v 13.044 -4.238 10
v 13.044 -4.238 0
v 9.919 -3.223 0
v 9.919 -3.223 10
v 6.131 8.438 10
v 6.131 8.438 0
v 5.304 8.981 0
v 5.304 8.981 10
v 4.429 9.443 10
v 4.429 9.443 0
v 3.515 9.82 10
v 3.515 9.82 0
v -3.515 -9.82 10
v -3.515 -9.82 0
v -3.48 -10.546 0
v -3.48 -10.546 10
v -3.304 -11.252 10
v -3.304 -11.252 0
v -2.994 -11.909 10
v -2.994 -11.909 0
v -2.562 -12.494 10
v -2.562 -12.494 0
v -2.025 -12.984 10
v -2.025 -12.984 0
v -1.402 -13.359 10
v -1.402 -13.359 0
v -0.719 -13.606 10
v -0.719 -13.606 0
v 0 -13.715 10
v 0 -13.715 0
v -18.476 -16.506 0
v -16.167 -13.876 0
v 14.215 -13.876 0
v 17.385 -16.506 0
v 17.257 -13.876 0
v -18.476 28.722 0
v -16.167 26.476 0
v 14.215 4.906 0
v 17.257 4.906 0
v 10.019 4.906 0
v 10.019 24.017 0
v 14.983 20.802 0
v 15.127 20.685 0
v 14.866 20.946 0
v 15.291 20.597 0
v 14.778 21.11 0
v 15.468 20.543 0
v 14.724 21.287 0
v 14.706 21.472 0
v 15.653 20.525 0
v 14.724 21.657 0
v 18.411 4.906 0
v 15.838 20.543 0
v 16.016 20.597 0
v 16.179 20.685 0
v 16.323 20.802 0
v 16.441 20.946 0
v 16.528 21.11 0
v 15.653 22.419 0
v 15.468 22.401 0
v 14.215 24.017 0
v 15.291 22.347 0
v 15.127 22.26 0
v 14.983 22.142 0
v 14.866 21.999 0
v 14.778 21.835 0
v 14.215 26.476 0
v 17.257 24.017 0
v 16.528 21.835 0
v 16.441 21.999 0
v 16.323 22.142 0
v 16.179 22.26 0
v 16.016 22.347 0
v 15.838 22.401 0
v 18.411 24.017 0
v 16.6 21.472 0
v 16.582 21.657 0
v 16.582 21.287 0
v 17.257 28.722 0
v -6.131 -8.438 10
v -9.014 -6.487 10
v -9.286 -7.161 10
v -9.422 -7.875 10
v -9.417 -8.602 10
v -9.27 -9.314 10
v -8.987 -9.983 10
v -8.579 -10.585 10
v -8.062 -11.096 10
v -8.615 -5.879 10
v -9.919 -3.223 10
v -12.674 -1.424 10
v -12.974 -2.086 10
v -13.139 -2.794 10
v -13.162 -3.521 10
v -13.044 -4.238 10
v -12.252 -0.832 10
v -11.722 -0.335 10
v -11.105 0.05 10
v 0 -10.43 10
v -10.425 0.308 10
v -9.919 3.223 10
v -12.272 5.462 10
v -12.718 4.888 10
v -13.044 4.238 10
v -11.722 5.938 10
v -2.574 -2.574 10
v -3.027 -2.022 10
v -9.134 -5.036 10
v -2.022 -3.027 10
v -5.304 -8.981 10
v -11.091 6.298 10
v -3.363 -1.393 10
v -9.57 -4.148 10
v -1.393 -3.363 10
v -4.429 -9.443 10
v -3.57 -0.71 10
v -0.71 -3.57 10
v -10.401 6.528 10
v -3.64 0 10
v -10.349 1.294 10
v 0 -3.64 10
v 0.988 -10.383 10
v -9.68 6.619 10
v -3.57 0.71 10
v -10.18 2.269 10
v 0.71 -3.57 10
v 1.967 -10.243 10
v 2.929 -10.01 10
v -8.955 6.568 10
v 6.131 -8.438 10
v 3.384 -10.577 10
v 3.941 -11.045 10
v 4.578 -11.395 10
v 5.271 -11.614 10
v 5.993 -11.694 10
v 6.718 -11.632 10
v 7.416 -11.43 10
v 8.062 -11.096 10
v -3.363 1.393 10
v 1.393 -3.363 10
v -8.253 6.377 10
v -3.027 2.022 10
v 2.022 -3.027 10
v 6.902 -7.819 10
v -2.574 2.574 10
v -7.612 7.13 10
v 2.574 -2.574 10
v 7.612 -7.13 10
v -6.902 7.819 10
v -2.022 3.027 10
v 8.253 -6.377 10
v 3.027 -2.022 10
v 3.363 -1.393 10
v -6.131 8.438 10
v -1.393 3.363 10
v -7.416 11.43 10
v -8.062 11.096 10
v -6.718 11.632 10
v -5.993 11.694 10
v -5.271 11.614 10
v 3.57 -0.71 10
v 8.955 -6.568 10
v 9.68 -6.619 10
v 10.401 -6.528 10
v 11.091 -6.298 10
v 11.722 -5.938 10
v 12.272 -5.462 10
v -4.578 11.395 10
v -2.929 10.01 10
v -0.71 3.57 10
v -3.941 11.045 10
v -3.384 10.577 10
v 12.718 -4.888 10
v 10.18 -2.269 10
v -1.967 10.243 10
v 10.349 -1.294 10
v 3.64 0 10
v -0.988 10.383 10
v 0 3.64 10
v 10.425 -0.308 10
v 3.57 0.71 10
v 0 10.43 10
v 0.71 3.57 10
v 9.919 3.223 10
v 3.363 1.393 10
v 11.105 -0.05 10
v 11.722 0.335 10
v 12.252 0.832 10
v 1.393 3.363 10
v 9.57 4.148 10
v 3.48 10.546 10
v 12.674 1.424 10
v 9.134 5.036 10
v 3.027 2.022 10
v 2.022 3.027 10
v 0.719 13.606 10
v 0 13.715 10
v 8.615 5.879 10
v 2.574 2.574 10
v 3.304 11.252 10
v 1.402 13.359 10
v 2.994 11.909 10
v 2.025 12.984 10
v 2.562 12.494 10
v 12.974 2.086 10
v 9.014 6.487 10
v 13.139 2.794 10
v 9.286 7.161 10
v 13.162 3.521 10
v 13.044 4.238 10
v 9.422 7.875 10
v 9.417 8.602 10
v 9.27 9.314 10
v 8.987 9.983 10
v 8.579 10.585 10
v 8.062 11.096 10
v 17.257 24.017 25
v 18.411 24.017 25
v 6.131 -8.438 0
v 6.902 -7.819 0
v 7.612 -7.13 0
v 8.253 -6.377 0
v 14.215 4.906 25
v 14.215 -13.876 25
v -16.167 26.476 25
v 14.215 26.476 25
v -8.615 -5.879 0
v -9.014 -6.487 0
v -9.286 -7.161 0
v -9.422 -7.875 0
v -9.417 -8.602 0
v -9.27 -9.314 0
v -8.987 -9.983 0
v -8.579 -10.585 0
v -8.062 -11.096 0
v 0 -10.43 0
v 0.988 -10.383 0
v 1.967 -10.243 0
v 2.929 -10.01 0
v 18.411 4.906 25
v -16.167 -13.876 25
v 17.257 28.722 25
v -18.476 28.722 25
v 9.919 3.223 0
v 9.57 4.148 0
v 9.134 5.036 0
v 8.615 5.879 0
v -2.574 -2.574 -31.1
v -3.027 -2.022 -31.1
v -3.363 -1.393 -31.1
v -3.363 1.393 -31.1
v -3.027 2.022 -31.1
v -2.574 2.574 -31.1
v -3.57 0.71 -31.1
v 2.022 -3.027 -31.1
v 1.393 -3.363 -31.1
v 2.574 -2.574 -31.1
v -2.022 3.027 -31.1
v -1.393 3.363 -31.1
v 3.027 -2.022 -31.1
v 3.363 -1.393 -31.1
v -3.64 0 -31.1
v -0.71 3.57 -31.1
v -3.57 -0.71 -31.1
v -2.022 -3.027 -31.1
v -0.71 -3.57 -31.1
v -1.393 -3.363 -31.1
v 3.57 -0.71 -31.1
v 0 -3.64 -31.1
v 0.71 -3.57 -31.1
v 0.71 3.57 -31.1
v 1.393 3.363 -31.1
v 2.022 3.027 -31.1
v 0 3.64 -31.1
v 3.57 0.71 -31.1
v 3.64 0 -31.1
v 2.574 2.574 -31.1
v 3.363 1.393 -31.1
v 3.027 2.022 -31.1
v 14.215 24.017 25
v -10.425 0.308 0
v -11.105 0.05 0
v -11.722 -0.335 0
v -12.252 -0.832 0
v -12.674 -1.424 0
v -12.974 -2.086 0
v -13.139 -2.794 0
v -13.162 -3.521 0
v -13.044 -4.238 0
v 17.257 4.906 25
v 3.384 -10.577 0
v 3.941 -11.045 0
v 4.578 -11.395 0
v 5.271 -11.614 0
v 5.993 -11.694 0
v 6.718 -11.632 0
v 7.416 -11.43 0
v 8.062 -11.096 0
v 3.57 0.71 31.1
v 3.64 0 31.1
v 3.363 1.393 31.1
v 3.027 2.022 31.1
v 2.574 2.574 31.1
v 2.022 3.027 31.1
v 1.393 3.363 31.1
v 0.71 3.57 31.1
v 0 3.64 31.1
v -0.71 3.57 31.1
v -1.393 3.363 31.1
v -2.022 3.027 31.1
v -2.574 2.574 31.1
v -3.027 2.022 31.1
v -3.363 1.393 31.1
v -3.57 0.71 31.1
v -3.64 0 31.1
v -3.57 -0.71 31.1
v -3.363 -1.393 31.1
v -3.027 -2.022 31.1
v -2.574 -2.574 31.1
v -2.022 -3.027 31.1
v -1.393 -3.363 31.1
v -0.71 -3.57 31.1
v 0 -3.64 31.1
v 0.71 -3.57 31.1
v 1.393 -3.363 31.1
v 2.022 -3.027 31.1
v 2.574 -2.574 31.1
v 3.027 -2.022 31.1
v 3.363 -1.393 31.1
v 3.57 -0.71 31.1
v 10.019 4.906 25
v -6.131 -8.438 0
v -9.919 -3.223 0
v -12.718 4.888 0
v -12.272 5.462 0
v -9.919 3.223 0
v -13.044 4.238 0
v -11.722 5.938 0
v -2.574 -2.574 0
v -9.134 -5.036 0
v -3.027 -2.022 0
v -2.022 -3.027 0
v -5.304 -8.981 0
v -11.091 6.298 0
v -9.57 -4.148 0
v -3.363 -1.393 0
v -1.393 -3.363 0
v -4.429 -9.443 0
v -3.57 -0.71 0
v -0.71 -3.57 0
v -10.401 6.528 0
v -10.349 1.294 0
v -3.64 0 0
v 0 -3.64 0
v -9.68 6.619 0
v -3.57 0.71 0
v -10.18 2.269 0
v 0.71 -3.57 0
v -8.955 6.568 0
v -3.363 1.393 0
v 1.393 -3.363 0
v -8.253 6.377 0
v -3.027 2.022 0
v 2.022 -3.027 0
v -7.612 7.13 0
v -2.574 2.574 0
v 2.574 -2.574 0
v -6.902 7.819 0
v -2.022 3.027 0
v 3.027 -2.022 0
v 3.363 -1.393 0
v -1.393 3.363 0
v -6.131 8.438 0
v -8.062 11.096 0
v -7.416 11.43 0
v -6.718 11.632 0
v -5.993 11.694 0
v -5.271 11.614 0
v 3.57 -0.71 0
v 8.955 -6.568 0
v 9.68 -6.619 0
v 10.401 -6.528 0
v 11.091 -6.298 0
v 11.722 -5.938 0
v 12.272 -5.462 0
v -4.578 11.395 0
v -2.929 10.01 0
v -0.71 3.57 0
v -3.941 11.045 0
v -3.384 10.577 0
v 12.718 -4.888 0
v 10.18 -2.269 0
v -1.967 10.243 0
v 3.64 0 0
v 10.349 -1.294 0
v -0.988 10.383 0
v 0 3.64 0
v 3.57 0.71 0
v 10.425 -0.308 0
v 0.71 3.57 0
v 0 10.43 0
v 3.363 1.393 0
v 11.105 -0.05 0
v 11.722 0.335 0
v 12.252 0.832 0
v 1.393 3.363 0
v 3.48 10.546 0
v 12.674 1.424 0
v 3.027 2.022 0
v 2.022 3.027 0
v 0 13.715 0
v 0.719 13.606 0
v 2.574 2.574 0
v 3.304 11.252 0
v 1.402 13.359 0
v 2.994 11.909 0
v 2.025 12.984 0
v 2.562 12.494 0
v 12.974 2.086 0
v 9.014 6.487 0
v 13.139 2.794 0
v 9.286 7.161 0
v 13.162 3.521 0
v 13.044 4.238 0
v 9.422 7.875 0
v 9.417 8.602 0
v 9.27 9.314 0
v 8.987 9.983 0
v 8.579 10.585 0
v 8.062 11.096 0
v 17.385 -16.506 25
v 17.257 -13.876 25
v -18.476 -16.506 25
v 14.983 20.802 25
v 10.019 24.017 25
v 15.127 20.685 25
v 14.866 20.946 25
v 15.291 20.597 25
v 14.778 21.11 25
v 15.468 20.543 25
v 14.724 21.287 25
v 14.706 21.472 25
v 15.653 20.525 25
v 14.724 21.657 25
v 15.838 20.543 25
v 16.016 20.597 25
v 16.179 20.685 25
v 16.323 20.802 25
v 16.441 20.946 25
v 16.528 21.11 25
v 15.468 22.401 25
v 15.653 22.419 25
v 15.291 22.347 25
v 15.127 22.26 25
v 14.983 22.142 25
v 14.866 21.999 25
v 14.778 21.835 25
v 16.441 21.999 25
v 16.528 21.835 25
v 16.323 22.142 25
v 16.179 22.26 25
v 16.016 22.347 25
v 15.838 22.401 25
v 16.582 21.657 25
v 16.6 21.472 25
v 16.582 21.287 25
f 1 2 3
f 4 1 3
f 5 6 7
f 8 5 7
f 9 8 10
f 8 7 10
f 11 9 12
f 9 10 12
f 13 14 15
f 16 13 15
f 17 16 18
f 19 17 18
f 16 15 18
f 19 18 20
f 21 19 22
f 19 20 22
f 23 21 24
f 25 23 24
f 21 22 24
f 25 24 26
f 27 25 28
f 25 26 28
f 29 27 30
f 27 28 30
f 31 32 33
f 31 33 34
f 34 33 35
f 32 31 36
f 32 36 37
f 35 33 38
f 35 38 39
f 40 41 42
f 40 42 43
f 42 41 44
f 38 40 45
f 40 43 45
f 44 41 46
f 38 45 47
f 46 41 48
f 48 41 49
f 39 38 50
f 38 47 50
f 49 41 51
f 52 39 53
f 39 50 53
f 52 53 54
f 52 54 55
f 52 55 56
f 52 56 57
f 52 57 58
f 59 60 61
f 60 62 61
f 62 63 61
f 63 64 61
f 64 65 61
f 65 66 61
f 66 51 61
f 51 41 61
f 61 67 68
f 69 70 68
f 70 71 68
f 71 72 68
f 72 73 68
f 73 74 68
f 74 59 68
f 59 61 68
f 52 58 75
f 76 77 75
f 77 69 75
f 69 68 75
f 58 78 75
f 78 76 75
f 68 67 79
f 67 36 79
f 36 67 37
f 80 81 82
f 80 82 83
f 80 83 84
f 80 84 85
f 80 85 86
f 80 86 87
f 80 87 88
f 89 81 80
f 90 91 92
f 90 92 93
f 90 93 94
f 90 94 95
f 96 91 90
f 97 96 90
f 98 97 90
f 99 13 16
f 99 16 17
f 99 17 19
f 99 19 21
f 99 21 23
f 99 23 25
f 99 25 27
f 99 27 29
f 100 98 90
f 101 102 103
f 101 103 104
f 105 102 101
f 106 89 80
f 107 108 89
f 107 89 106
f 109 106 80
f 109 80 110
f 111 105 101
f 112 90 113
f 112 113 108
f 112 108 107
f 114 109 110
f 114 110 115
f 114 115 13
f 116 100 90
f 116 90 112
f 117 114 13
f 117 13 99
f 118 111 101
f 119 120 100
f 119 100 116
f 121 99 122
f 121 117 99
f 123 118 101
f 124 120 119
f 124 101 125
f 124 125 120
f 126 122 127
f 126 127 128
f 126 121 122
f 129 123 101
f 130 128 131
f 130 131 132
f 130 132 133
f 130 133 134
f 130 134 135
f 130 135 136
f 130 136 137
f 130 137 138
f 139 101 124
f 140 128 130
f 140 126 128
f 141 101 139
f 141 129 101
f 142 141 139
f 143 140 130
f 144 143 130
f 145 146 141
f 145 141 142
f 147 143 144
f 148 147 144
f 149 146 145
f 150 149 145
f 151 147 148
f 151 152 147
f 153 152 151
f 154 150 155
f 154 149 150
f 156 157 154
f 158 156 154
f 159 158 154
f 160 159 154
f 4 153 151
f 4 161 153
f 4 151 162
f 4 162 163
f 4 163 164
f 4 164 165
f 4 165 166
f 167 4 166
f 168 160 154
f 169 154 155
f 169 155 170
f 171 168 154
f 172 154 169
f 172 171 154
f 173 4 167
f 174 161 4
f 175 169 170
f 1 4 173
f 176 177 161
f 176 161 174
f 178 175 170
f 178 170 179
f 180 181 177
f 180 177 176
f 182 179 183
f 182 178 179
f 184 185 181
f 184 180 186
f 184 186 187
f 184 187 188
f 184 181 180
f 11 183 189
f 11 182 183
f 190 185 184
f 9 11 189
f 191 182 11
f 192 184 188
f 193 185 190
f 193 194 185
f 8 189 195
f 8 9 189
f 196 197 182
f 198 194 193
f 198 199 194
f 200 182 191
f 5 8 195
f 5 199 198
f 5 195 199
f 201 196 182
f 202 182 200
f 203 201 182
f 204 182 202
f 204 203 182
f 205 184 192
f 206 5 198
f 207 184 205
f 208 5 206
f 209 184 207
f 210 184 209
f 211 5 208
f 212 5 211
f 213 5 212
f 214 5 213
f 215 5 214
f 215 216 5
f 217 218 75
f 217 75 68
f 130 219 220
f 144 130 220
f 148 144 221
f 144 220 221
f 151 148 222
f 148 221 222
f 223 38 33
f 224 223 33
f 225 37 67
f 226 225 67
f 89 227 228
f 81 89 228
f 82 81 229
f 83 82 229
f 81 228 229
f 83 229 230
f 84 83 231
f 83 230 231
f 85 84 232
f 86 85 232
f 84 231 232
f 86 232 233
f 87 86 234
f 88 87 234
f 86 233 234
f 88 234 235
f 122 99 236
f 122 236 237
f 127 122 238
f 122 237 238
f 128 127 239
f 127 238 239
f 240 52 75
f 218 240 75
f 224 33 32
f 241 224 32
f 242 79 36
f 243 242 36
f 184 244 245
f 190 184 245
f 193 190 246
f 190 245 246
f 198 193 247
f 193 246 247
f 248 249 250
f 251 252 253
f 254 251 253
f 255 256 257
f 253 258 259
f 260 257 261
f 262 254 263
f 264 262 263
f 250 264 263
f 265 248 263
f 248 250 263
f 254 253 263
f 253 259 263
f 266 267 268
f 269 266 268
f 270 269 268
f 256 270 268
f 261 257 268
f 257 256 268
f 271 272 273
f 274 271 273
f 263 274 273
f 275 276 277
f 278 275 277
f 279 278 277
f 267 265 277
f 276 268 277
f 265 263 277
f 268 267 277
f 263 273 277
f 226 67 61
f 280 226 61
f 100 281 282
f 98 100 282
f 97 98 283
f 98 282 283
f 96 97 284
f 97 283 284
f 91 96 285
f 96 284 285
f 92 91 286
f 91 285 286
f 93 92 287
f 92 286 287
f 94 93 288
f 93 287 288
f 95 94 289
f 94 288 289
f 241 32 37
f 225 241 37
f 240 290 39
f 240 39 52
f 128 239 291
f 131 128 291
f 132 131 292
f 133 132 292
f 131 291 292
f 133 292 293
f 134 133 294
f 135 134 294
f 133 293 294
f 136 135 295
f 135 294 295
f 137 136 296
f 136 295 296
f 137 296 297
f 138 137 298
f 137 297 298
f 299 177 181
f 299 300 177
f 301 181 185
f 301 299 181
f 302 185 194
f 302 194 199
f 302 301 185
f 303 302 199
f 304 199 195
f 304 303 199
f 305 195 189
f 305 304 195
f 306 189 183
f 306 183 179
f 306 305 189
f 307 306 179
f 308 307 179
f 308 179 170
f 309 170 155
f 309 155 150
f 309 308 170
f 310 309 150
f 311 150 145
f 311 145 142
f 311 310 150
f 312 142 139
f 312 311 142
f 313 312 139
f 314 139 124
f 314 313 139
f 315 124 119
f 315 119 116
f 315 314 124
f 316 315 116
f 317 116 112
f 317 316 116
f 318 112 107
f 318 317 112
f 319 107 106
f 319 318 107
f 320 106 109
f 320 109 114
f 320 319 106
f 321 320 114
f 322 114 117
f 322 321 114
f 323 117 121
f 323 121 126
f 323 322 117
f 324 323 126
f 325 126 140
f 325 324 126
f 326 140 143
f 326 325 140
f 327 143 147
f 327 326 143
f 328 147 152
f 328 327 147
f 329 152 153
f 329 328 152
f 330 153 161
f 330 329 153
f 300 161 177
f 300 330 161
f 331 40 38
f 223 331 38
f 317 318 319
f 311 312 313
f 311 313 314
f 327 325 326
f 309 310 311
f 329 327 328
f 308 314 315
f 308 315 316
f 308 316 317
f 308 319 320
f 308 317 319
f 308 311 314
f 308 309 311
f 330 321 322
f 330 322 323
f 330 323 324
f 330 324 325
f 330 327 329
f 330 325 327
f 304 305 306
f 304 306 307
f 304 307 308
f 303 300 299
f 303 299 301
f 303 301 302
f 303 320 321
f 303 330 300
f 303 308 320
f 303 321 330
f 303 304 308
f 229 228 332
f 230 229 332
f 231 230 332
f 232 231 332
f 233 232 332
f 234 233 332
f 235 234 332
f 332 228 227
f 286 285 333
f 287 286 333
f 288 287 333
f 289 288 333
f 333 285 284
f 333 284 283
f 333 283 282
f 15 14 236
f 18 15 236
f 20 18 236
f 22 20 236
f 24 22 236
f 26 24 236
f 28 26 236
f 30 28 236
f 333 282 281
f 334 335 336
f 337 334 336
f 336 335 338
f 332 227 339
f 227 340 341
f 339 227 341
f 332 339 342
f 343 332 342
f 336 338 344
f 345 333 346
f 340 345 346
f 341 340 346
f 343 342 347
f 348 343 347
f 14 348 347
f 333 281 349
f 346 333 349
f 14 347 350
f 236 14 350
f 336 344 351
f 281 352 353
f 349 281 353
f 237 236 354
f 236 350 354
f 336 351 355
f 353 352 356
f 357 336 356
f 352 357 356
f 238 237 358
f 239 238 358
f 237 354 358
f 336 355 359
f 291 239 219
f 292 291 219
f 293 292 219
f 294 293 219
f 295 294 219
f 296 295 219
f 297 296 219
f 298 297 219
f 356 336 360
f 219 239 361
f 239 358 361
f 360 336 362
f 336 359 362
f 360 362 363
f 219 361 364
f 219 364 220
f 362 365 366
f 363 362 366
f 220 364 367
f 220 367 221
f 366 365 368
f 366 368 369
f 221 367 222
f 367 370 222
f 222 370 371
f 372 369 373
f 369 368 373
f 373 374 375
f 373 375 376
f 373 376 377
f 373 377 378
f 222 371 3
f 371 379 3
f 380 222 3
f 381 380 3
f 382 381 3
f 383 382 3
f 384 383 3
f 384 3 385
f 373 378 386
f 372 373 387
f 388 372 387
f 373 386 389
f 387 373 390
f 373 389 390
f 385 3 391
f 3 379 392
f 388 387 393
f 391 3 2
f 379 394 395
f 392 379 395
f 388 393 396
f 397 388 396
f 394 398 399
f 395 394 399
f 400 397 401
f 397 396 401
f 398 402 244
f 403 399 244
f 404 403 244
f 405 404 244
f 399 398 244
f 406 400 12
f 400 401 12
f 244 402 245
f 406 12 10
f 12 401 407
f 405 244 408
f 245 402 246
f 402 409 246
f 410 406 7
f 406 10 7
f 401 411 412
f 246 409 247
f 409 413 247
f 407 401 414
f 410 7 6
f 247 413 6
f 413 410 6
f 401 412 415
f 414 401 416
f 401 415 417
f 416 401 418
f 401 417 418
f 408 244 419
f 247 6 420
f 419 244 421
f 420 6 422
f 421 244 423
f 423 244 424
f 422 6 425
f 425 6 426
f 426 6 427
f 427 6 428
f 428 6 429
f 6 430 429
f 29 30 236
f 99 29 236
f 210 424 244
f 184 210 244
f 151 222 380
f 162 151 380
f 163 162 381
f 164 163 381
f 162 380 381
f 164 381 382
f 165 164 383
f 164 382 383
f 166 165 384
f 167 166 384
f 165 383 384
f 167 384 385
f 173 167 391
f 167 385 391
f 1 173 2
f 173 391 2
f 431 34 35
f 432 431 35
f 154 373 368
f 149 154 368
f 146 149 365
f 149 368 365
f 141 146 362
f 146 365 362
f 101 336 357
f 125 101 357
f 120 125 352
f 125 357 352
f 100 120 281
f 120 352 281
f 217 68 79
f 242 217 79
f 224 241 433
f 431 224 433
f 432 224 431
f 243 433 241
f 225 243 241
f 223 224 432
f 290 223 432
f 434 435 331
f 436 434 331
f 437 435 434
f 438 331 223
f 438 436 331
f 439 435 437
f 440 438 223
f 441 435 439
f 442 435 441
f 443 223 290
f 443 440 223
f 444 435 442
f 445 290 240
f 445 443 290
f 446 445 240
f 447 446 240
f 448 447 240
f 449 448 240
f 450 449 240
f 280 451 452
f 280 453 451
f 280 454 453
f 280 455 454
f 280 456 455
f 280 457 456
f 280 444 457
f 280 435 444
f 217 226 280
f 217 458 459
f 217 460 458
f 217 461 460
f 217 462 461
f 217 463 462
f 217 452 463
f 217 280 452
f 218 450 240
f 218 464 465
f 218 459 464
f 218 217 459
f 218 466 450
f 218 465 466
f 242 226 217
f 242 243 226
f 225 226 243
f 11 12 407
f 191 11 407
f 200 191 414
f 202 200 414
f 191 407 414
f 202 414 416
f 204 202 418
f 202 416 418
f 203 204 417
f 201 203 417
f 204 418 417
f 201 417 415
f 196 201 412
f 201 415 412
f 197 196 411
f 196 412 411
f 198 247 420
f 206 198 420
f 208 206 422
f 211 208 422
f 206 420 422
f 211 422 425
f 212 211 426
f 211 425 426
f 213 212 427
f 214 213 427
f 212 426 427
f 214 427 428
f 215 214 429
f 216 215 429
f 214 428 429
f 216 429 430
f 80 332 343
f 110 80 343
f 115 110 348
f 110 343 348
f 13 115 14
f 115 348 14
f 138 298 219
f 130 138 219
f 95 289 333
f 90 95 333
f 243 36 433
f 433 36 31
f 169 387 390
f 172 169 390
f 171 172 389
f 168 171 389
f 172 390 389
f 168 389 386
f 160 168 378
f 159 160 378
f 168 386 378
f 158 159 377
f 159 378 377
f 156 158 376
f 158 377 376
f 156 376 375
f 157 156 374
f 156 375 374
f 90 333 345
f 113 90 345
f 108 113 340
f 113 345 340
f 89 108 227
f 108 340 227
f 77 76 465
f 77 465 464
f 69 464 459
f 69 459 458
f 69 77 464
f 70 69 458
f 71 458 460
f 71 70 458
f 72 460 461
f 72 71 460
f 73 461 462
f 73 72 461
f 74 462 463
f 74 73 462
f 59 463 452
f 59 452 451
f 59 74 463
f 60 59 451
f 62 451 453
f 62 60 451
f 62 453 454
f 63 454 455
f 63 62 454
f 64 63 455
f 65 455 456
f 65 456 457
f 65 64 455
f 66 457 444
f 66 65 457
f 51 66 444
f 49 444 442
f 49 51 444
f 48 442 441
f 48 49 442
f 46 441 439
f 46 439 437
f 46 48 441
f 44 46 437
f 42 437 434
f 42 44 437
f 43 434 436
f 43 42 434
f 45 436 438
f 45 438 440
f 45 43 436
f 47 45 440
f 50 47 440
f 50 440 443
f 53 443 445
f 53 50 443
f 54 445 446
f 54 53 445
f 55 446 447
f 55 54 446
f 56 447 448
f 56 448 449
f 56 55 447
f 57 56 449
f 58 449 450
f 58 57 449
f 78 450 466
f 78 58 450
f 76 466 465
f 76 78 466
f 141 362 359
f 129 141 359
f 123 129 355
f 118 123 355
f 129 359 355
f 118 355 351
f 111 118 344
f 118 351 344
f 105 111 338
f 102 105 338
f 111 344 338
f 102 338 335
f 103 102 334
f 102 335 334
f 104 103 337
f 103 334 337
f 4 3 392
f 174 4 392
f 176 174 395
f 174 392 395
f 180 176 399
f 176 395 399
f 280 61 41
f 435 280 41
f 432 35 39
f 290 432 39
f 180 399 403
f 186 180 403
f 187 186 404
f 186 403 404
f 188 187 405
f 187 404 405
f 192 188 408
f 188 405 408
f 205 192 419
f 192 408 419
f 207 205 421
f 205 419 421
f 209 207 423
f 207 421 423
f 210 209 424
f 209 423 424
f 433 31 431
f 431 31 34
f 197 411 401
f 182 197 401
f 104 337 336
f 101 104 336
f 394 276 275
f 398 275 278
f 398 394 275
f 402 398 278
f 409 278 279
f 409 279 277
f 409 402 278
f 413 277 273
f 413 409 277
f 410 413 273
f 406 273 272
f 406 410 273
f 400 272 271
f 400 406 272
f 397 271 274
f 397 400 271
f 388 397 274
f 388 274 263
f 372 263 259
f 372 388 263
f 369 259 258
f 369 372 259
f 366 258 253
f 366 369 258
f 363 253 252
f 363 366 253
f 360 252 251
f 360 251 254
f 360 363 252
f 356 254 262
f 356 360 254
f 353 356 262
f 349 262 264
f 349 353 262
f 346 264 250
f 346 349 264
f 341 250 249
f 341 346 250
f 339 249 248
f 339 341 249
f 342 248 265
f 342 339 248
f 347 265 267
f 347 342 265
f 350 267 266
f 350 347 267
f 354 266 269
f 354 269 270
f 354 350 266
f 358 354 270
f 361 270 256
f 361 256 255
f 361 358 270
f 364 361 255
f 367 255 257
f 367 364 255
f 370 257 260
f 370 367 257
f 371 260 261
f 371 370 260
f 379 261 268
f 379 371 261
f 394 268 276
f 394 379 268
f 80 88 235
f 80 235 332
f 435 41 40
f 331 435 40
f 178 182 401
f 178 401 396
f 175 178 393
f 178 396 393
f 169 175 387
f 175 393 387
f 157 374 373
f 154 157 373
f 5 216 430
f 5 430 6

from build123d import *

# Parameters (mm, degrees)
F0_R     = 3.640353
F1_DEPTH = 10
F2_R     = 0.947204
F3_DEPTH = 25
F4_DEPTH = 31.1


with BuildPart() as f1:
    # F0 (on Top) → F1 (new body)
    with BuildSketch(Plane.XY):
        with BuildLine():
            Line((-8.061643, 11.0959), (-6.130575, 8.438013))
            ThreePointArc((-6.130575, 8.438013), (-7.265387, 7.483192), (-8.253301, 6.377071))
            ThreePointArc((-8.253301, 6.377071), (-11.09072, 6.297838), (-13.044013, 4.238257))
            Line((-13.044013, 4.238257), (-9.919479, 3.223034))
            ThreePointArc((-9.919479, 3.223034), (-10.276331, 1.783543), (-10.425409, 0.307991))
            ThreePointArc((-10.425409, 0.307991), (-12.674357, -1.423904), (-13.044013, -4.238257))
            Line((-13.044013, -4.238257), (-9.919479, -3.223034))
            ThreePointArc((-9.919479, -3.223034), (-9.362067, -4.59736), (-8.615365, -5.878732))
            ThreePointArc((-8.615365, -5.878732), (-9.416821, -8.601763), (-8.061643, -11.0959))
            Line((-8.061643, -11.0959), (-6.130575, -8.438013))
            ThreePointArc((-6.130575, -8.438013), (-4.871811, -9.222227), (-3.514545, -9.819979))
            ThreePointArc((-3.514545, -9.819979), (-2.562379, -12.494041), (0, -13.715287))
            Line((0, -13.715287), (0, -10.429957))
            ThreePointArc((0, -10.429957), (1.479311, -10.324517), (2.928712, -10.010327))
            ThreePointArc((2.928712, -10.010327), (5.270805, -11.614019), (8.061643, -11.0959))
            Line((8.061643, -11.0959), (6.130575, -8.438013))
            ThreePointArc((6.130575, -8.438013), (7.265387, -7.483192), (8.253301, -6.377071))
            ThreePointArc((8.253301, -6.377071), (11.09072, -6.297838), (13.044013, -4.238257))
            Line((13.044013, -4.238257), (9.919479, -3.223034))
            ThreePointArc((9.919479, -3.223034), (10.276331, -1.783543), (10.425409, -0.307991))
            ThreePointArc((10.425409, -0.307991), (12.674357, 1.423904), (13.044013, 4.238257))
            Line((13.044013, 4.238257), (9.919479, 3.223034))
            ThreePointArc((9.919479, 3.223034), (9.362067, 4.59736), (8.615365, 5.878732))
            ThreePointArc((8.615365, 5.878732), (9.416821, 8.601763), (8.061643, 11.0959))
            Line((8.061643, 11.0959), (6.130575, 8.438013))
            ThreePointArc((6.130575, 8.438013), (4.871811, 9.222227), (3.514545, 9.819979))
            ThreePointArc((3.514545, 9.819979), (2.562379, 12.494041), (0, 13.715287))
            Line((0, 13.715287), (0, 10.429957))
            ThreePointArc((0, 10.429957), (-1.479311, 10.324517), (-2.928712, 10.010327))
            ThreePointArc((-2.928712, 10.010327), (-5.270805, 11.614019), (-8.061643, 11.0959))
        make_face()
        Circle(F0_R, mode=Mode.SUBTRACT)
    extrude(amount=F1_DEPTH)

    # F0 (on Top) → F4 (join, symmetric)
    with BuildSketch(Plane.XY):
        Circle(F0_R)
    extrude(amount=F4_DEPTH, both=True)


with BuildPart() as f3:
    # F2 (on Top) → F3 (new body)
    with BuildSketch(Plane.XY):
        Polygon((17.25694, 4.906488), (14.214994, 4.906488), (14.214994, -13.87594), (-16.166694, -13.87594), (-16.166694, 26.476193), (14.214994, 26.476193), (14.214994, 24.017386), (17.25694, 24.017386), (17.25694, 26.476193), (17.25694, 28.721543), (-18.476197, 28.721543), (-18.476197, -16.506206), (-16.166694, -16.506206), (17.385239, -16.506206), (17.25694, -13.87594), align=None)
        Polygon((10.018989, 24.017386), (10.018989, 4.906488), (14.214994, 4.906488), (17.25694, 4.906488), (18.410999, 4.906488), (18.410999, 24.017386), (17.25694, 24.017386), (14.214994, 24.017386), align=None)
        with Locations((15.65312, 21.472272)):
            Circle(F2_R, mode=Mode.SUBTRACT)
    extrude(amount=F3_DEPTH)


solid = Compound([f1.part, f3.part])
